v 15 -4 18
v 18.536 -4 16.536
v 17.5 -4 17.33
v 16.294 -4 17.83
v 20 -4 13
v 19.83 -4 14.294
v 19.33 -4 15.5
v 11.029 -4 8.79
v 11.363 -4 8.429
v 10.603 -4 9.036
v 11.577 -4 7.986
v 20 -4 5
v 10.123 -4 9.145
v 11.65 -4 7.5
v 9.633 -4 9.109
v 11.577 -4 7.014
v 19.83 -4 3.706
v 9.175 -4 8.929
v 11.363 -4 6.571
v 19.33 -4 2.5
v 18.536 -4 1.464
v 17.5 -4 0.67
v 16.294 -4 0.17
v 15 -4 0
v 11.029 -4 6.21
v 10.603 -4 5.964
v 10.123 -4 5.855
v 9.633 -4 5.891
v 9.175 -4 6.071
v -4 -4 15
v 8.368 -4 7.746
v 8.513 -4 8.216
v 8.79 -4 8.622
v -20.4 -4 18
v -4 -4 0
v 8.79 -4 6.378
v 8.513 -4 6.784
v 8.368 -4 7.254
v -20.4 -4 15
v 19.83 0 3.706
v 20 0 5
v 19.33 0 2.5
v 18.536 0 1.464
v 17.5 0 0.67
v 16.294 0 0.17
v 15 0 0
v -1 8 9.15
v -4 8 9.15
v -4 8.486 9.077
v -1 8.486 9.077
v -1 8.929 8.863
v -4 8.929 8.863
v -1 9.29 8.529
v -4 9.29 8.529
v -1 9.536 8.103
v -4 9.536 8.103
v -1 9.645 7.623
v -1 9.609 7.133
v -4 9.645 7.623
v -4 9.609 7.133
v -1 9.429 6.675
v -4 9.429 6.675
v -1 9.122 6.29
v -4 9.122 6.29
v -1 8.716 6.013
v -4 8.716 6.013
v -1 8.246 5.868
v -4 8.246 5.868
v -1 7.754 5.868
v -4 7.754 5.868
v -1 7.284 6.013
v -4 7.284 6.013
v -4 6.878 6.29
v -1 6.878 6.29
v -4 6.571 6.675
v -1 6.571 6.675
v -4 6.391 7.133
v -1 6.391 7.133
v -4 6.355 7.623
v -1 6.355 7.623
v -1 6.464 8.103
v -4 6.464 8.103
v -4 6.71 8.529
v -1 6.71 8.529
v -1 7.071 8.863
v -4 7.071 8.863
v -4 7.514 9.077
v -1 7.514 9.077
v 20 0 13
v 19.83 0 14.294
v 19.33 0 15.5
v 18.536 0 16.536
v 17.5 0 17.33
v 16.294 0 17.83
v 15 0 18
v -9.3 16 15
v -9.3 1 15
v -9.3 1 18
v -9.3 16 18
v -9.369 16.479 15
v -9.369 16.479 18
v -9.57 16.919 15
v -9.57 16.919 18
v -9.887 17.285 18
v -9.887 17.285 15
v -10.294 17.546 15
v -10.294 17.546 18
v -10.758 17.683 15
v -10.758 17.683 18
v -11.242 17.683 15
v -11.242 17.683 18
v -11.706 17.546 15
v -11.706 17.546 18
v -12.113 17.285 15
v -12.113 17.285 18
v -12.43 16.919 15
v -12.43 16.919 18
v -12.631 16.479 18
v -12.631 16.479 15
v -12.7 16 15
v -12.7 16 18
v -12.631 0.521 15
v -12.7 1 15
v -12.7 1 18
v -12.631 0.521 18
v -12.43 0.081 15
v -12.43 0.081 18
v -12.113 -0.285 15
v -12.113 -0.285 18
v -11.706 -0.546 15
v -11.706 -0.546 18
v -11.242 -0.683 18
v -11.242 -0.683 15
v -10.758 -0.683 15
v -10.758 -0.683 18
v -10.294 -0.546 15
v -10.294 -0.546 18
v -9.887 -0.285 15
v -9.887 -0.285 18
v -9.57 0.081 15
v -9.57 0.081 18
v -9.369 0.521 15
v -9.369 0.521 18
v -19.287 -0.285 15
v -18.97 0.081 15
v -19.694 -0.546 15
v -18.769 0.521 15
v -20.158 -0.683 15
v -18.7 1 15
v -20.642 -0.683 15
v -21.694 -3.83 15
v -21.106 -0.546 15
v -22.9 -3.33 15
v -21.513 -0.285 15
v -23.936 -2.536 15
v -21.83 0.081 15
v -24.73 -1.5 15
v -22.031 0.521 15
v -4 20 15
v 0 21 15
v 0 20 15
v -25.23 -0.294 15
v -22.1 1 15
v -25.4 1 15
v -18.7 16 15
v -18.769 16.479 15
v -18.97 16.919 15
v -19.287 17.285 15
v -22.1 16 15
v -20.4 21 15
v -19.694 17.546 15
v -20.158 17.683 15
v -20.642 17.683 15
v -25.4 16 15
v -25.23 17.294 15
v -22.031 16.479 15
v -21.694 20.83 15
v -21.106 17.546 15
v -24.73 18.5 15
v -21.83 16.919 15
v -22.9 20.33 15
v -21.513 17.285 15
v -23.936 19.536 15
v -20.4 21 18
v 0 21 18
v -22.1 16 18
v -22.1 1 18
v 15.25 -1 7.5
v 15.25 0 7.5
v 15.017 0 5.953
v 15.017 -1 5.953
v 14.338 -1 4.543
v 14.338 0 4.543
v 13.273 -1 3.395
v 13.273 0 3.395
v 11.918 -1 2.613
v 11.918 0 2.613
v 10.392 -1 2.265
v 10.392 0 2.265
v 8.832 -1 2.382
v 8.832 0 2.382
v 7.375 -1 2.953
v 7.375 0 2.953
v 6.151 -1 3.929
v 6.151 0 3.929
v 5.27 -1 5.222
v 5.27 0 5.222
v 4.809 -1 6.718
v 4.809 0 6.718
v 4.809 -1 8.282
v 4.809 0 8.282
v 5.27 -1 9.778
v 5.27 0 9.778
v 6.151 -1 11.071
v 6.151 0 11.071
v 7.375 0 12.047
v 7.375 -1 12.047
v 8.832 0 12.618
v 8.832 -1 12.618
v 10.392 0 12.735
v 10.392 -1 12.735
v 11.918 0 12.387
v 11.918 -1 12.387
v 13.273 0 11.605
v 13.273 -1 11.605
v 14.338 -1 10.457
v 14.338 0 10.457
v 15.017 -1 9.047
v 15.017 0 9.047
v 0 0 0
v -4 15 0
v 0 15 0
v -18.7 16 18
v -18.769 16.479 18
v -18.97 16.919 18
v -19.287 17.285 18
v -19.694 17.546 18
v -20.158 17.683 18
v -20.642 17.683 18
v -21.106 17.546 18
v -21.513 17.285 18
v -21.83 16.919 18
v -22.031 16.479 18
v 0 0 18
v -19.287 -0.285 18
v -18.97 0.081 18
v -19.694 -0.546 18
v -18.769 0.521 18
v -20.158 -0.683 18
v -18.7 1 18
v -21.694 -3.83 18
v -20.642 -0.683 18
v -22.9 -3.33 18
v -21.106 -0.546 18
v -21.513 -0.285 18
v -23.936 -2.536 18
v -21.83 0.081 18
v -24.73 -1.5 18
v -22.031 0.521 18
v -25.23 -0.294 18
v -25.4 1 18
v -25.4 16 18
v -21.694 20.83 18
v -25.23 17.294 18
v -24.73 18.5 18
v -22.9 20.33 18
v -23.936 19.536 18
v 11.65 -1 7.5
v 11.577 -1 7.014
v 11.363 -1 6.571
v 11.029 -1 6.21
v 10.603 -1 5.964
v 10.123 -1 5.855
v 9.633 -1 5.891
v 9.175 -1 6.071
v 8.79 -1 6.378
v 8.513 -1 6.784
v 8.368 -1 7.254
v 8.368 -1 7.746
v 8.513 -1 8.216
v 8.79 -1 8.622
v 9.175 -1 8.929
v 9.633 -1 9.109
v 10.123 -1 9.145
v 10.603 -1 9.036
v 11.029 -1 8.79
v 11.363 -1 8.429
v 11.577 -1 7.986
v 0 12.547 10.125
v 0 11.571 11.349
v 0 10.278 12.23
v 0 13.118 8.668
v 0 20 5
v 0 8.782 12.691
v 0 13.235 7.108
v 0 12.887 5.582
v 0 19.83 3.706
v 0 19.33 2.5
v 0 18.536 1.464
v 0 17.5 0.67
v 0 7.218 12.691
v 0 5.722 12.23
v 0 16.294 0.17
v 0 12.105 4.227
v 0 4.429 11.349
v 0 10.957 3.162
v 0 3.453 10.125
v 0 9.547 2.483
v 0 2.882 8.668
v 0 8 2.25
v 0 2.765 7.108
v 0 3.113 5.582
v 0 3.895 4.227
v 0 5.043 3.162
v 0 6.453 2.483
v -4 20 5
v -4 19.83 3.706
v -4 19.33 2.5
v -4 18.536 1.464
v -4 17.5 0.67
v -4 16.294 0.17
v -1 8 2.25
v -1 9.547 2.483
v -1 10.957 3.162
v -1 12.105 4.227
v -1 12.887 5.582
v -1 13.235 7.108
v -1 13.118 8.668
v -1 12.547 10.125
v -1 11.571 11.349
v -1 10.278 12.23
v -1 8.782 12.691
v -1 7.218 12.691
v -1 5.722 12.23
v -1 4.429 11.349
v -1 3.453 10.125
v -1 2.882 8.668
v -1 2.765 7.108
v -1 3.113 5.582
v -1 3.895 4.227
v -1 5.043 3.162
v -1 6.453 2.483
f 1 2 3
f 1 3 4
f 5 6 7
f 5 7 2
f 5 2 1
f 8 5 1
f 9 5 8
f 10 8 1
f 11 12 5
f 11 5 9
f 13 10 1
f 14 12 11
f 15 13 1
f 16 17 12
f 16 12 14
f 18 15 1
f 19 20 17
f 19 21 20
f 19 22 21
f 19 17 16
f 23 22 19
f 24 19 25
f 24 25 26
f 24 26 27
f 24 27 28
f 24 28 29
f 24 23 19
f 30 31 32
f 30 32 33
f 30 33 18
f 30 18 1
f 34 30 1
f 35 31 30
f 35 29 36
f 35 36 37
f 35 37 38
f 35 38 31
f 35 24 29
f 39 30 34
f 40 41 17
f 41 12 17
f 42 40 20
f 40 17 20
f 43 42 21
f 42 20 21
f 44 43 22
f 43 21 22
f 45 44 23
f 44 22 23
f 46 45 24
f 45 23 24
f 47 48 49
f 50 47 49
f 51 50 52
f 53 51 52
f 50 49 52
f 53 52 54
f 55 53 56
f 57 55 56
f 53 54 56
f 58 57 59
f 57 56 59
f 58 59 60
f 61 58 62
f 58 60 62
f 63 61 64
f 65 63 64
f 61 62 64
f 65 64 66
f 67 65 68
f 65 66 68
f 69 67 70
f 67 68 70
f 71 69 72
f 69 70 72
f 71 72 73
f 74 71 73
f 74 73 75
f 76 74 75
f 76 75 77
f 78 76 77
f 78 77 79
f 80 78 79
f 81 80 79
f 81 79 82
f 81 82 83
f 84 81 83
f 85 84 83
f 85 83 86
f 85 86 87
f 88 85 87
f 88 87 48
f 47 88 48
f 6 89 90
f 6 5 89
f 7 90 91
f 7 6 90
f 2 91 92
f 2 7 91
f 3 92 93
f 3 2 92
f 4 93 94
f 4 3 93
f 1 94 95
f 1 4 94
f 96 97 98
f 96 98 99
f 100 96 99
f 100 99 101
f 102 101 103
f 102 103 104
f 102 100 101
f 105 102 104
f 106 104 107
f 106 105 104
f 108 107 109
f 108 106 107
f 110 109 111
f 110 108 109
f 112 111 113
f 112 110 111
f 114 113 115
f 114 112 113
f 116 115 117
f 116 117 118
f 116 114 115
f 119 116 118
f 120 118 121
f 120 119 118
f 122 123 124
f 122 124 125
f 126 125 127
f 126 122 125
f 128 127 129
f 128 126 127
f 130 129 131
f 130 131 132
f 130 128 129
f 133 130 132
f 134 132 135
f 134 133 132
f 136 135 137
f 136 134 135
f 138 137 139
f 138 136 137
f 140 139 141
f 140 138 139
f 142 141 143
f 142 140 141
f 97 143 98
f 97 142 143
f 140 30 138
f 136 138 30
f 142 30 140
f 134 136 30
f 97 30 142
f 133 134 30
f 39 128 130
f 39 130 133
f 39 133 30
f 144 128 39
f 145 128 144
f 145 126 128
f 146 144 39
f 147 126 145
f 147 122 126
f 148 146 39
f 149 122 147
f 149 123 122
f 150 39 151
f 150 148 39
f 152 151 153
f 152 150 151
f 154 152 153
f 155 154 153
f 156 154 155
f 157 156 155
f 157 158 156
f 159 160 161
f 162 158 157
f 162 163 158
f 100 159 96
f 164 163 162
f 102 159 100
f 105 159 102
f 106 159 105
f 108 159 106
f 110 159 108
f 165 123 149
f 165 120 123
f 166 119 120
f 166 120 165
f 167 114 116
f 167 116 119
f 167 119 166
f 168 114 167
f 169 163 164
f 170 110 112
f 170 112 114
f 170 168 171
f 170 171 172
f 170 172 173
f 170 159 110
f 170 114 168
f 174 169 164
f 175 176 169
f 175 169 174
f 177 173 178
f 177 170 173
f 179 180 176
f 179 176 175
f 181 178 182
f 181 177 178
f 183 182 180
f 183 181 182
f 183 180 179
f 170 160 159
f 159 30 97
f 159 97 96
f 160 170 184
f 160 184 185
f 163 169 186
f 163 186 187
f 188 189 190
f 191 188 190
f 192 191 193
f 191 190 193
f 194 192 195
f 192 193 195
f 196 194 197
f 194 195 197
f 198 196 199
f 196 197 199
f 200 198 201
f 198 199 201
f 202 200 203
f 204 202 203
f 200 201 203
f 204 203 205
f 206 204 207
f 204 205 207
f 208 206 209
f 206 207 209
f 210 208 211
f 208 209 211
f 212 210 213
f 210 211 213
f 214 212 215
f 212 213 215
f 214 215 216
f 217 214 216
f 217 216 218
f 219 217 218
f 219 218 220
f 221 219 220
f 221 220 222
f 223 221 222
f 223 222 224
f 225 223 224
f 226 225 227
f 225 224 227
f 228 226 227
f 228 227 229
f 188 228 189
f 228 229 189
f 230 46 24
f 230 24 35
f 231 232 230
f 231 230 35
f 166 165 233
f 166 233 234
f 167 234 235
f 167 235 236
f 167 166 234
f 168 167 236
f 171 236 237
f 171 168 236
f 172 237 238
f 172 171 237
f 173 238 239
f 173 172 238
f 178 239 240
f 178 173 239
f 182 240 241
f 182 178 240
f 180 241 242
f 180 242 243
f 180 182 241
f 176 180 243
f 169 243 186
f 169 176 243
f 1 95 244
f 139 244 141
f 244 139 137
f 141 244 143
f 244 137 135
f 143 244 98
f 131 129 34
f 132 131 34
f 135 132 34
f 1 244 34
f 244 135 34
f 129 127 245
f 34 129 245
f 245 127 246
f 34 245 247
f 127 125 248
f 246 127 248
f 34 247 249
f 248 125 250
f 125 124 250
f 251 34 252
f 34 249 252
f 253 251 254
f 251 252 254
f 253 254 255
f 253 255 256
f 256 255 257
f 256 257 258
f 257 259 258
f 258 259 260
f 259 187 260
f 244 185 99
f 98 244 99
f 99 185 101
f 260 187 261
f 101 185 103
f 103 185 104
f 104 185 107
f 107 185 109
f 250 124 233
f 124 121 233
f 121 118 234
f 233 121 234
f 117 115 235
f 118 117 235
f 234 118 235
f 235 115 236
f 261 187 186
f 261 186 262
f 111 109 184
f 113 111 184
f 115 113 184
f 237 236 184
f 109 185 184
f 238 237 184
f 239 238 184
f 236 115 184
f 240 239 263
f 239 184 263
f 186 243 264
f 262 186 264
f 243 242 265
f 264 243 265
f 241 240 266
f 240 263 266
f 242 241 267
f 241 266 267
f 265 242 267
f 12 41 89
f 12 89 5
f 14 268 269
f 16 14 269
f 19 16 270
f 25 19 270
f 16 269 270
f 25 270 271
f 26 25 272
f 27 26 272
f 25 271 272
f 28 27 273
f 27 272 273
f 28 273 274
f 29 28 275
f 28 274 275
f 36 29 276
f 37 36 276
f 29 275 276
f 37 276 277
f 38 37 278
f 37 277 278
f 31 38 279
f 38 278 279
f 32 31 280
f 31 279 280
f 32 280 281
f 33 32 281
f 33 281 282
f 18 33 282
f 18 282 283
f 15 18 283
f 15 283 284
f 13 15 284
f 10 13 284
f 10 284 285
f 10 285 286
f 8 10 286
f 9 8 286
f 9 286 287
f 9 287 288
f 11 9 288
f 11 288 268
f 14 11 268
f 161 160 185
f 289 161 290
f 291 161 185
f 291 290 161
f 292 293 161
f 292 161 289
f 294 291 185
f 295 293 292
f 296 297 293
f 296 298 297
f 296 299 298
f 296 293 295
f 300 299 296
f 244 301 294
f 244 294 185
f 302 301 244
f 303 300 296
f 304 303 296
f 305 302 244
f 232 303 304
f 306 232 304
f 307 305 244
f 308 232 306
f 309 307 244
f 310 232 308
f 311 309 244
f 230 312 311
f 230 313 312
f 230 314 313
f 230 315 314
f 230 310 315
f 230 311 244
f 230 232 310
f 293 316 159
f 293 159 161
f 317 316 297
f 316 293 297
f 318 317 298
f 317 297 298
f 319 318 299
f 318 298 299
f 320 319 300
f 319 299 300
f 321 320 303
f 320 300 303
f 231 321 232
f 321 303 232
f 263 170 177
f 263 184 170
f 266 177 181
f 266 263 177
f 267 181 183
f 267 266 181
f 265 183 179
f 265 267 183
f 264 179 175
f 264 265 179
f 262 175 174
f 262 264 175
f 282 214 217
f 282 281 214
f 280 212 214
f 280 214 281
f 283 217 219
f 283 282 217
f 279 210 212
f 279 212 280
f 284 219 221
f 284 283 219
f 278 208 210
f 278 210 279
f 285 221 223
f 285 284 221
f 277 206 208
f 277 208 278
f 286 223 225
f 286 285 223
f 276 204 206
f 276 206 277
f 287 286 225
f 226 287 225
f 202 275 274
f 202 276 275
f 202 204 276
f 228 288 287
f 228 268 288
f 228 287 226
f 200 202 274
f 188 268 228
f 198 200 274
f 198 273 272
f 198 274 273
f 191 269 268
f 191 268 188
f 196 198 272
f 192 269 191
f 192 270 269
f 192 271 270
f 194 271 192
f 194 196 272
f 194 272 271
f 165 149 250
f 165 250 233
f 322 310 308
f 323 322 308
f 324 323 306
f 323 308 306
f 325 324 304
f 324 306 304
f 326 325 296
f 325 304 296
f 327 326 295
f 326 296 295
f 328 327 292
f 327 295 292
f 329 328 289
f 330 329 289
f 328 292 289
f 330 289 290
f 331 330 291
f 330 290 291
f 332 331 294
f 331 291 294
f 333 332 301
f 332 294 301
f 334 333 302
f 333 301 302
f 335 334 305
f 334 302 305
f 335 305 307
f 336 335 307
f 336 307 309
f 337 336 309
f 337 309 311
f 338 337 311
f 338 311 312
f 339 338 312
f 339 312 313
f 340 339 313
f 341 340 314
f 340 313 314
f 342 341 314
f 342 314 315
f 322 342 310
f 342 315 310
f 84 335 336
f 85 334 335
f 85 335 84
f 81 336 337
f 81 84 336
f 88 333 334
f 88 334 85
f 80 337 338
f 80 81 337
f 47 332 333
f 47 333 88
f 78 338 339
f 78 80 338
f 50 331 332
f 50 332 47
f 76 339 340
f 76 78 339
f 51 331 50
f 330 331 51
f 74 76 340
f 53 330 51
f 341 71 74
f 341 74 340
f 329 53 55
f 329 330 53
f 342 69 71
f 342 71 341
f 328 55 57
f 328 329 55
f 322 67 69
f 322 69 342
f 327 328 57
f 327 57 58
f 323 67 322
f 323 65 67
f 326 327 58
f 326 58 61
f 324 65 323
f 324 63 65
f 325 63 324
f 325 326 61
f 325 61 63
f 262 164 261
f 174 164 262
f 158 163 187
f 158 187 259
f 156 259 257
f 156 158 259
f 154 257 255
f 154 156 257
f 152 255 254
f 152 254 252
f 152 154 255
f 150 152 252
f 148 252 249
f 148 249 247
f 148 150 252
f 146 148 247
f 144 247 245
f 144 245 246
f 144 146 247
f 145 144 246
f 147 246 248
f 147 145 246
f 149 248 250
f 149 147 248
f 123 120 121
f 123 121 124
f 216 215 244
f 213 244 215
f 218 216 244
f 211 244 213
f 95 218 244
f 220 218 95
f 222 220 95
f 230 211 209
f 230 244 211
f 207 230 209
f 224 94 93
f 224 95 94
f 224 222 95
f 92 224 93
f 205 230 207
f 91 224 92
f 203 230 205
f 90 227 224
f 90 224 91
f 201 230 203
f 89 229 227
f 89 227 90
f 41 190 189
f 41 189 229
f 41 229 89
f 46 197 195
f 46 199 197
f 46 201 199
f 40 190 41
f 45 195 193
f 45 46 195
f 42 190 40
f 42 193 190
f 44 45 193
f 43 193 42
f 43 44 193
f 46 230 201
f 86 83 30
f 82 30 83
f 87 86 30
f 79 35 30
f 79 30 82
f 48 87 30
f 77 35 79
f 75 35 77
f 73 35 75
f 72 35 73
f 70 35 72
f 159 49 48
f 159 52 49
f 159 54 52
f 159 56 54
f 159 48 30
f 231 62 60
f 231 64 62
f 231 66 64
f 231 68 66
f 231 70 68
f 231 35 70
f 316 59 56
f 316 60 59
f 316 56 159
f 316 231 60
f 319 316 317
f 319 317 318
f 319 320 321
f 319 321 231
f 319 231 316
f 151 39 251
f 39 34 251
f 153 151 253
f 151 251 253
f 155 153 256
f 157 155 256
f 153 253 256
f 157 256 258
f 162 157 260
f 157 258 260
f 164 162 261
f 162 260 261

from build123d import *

# Parameters (mm, degrees)
RESSALTO_EXTRUS_O2_DEPTH   = 15
ESBO_O4_R                  = 1.65
CORTE_EXTRUS_O1_DEPTH      = 1
CORTE_EXTRUS_O1_DEPTH_BACK = 25
ESBO_O5_R                  = 1.65
CORTE_EXTRUS_O2_DEPTH      = 15
ESBO_O6_R                  = 5.25
CORTE_EXTRUS_O3_DEPTH      = 1
ESBO_O7_R                  = 5.25
CORTE_EXTRUS_O4_DEPTH      = 1
RESSALTO_EXTRUS_O3_DEPTH   = 3
FILETE1_R                  = 5


with BuildPart() as part:
    # Esboço2 → Ressalto-extrusão2 (new body)
    with BuildSketch(Plane.XY):
        Polygon((0, 0), (20, 0), (20, -4), (-4, -4), (-4, 20), (0, 20), align=None)
    extrude(amount=RESSALTO_EXTRUS_O2_DEPTH)

    # Esboço4 → Corte-extrusão1 (cut, two sides)
    with BuildSketch(Plane.ZY.offset(4)) as corte_extrus_o1_sk:
        with Locations((7.5, 8)):
            Circle(ESBO_O4_R)
    extrude(amount=CORTE_EXTRUS_O1_DEPTH, mode=Mode.SUBTRACT)
    extrude(corte_extrus_o1_sk.sketch, amount=-CORTE_EXTRUS_O1_DEPTH_BACK, mode=Mode.SUBTRACT)

    # Esboço5 → Corte-extrusão2 (cut)
    with BuildSketch(Plane(origin=(0, 0, 0), x_dir=(1, 0, 0), z_dir=(0, 1, 0))):
        with Locations((10, -7.5)):
            Circle(ESBO_O5_R)
    extrude(amount=-CORTE_EXTRUS_O2_DEPTH, mode=Mode.SUBTRACT)

    # Esboço6 → Corte-extrusão3 (cut)
    with BuildSketch(Plane(origin=(0, 0, 0), x_dir=(1, 0, 0), z_dir=(0, 1, 0))):
        with Locations((10, -7.5)):
            Circle(ESBO_O6_R)
    extrude(amount=-CORTE_EXTRUS_O3_DEPTH, mode=Mode.SUBTRACT)

    # Esboço7 → Corte-extrusão4 (cut)
    with BuildSketch(Plane(origin=(0, 0, 0), x_dir=(0, 0, -1), z_dir=(1, 0, 0))):
        with Locations((-7.5, 8)):
            Circle(ESBO_O7_R)
    extrude(amount=-CORTE_EXTRUS_O4_DEPTH, mode=Mode.SUBTRACT)

    # Esboço9 → Ressalto-extrusão3 (add)
    with BuildSketch(Plane.XY.offset(15)):
        Polygon((20, -4), (-25.4, -4), (-25.4, 21), (0, 21), (0, 0), (20, 0), align=None)
        with BuildLine():
            Line((-22.1, 16), (-22.1, 1))
            ThreePointArc((-22.1, 1), (-20.4, -0.7), (-18.7, 1))
            Line((-18.7, 1), (-18.7, 16))
            ThreePointArc((-18.7, 16), (-20.4, 17.7), (-22.1, 16))
        make_face(mode=Mode.SUBTRACT)
        with BuildLine():
            Line((-9.3, 1), (-9.3, 16))
            ThreePointArc((-9.3, 16), (-11, 17.7), (-12.7, 16))
            Line((-12.7, 16), (-12.7, 1))
            ThreePointArc((-12.7, 1), (-11, -0.7), (-9.3, 1))
        make_face(mode=Mode.SUBTRACT)
    extrude(amount=RESSALTO_EXTRUS_O3_DEPTH)

    # Filete1
    filete1_edges = [part.edges().sort_by_distance(p)[0] for p in [
        (20, -2, 18),
        (-25.4, 21, 16.5),
        (-25.4, -4, 16.5),
        (20, -2, 0),
        (-2, 20, 0),
    ]]
    fillet(filete1_edges, radius=FILETE1_R)


solid = part.part
